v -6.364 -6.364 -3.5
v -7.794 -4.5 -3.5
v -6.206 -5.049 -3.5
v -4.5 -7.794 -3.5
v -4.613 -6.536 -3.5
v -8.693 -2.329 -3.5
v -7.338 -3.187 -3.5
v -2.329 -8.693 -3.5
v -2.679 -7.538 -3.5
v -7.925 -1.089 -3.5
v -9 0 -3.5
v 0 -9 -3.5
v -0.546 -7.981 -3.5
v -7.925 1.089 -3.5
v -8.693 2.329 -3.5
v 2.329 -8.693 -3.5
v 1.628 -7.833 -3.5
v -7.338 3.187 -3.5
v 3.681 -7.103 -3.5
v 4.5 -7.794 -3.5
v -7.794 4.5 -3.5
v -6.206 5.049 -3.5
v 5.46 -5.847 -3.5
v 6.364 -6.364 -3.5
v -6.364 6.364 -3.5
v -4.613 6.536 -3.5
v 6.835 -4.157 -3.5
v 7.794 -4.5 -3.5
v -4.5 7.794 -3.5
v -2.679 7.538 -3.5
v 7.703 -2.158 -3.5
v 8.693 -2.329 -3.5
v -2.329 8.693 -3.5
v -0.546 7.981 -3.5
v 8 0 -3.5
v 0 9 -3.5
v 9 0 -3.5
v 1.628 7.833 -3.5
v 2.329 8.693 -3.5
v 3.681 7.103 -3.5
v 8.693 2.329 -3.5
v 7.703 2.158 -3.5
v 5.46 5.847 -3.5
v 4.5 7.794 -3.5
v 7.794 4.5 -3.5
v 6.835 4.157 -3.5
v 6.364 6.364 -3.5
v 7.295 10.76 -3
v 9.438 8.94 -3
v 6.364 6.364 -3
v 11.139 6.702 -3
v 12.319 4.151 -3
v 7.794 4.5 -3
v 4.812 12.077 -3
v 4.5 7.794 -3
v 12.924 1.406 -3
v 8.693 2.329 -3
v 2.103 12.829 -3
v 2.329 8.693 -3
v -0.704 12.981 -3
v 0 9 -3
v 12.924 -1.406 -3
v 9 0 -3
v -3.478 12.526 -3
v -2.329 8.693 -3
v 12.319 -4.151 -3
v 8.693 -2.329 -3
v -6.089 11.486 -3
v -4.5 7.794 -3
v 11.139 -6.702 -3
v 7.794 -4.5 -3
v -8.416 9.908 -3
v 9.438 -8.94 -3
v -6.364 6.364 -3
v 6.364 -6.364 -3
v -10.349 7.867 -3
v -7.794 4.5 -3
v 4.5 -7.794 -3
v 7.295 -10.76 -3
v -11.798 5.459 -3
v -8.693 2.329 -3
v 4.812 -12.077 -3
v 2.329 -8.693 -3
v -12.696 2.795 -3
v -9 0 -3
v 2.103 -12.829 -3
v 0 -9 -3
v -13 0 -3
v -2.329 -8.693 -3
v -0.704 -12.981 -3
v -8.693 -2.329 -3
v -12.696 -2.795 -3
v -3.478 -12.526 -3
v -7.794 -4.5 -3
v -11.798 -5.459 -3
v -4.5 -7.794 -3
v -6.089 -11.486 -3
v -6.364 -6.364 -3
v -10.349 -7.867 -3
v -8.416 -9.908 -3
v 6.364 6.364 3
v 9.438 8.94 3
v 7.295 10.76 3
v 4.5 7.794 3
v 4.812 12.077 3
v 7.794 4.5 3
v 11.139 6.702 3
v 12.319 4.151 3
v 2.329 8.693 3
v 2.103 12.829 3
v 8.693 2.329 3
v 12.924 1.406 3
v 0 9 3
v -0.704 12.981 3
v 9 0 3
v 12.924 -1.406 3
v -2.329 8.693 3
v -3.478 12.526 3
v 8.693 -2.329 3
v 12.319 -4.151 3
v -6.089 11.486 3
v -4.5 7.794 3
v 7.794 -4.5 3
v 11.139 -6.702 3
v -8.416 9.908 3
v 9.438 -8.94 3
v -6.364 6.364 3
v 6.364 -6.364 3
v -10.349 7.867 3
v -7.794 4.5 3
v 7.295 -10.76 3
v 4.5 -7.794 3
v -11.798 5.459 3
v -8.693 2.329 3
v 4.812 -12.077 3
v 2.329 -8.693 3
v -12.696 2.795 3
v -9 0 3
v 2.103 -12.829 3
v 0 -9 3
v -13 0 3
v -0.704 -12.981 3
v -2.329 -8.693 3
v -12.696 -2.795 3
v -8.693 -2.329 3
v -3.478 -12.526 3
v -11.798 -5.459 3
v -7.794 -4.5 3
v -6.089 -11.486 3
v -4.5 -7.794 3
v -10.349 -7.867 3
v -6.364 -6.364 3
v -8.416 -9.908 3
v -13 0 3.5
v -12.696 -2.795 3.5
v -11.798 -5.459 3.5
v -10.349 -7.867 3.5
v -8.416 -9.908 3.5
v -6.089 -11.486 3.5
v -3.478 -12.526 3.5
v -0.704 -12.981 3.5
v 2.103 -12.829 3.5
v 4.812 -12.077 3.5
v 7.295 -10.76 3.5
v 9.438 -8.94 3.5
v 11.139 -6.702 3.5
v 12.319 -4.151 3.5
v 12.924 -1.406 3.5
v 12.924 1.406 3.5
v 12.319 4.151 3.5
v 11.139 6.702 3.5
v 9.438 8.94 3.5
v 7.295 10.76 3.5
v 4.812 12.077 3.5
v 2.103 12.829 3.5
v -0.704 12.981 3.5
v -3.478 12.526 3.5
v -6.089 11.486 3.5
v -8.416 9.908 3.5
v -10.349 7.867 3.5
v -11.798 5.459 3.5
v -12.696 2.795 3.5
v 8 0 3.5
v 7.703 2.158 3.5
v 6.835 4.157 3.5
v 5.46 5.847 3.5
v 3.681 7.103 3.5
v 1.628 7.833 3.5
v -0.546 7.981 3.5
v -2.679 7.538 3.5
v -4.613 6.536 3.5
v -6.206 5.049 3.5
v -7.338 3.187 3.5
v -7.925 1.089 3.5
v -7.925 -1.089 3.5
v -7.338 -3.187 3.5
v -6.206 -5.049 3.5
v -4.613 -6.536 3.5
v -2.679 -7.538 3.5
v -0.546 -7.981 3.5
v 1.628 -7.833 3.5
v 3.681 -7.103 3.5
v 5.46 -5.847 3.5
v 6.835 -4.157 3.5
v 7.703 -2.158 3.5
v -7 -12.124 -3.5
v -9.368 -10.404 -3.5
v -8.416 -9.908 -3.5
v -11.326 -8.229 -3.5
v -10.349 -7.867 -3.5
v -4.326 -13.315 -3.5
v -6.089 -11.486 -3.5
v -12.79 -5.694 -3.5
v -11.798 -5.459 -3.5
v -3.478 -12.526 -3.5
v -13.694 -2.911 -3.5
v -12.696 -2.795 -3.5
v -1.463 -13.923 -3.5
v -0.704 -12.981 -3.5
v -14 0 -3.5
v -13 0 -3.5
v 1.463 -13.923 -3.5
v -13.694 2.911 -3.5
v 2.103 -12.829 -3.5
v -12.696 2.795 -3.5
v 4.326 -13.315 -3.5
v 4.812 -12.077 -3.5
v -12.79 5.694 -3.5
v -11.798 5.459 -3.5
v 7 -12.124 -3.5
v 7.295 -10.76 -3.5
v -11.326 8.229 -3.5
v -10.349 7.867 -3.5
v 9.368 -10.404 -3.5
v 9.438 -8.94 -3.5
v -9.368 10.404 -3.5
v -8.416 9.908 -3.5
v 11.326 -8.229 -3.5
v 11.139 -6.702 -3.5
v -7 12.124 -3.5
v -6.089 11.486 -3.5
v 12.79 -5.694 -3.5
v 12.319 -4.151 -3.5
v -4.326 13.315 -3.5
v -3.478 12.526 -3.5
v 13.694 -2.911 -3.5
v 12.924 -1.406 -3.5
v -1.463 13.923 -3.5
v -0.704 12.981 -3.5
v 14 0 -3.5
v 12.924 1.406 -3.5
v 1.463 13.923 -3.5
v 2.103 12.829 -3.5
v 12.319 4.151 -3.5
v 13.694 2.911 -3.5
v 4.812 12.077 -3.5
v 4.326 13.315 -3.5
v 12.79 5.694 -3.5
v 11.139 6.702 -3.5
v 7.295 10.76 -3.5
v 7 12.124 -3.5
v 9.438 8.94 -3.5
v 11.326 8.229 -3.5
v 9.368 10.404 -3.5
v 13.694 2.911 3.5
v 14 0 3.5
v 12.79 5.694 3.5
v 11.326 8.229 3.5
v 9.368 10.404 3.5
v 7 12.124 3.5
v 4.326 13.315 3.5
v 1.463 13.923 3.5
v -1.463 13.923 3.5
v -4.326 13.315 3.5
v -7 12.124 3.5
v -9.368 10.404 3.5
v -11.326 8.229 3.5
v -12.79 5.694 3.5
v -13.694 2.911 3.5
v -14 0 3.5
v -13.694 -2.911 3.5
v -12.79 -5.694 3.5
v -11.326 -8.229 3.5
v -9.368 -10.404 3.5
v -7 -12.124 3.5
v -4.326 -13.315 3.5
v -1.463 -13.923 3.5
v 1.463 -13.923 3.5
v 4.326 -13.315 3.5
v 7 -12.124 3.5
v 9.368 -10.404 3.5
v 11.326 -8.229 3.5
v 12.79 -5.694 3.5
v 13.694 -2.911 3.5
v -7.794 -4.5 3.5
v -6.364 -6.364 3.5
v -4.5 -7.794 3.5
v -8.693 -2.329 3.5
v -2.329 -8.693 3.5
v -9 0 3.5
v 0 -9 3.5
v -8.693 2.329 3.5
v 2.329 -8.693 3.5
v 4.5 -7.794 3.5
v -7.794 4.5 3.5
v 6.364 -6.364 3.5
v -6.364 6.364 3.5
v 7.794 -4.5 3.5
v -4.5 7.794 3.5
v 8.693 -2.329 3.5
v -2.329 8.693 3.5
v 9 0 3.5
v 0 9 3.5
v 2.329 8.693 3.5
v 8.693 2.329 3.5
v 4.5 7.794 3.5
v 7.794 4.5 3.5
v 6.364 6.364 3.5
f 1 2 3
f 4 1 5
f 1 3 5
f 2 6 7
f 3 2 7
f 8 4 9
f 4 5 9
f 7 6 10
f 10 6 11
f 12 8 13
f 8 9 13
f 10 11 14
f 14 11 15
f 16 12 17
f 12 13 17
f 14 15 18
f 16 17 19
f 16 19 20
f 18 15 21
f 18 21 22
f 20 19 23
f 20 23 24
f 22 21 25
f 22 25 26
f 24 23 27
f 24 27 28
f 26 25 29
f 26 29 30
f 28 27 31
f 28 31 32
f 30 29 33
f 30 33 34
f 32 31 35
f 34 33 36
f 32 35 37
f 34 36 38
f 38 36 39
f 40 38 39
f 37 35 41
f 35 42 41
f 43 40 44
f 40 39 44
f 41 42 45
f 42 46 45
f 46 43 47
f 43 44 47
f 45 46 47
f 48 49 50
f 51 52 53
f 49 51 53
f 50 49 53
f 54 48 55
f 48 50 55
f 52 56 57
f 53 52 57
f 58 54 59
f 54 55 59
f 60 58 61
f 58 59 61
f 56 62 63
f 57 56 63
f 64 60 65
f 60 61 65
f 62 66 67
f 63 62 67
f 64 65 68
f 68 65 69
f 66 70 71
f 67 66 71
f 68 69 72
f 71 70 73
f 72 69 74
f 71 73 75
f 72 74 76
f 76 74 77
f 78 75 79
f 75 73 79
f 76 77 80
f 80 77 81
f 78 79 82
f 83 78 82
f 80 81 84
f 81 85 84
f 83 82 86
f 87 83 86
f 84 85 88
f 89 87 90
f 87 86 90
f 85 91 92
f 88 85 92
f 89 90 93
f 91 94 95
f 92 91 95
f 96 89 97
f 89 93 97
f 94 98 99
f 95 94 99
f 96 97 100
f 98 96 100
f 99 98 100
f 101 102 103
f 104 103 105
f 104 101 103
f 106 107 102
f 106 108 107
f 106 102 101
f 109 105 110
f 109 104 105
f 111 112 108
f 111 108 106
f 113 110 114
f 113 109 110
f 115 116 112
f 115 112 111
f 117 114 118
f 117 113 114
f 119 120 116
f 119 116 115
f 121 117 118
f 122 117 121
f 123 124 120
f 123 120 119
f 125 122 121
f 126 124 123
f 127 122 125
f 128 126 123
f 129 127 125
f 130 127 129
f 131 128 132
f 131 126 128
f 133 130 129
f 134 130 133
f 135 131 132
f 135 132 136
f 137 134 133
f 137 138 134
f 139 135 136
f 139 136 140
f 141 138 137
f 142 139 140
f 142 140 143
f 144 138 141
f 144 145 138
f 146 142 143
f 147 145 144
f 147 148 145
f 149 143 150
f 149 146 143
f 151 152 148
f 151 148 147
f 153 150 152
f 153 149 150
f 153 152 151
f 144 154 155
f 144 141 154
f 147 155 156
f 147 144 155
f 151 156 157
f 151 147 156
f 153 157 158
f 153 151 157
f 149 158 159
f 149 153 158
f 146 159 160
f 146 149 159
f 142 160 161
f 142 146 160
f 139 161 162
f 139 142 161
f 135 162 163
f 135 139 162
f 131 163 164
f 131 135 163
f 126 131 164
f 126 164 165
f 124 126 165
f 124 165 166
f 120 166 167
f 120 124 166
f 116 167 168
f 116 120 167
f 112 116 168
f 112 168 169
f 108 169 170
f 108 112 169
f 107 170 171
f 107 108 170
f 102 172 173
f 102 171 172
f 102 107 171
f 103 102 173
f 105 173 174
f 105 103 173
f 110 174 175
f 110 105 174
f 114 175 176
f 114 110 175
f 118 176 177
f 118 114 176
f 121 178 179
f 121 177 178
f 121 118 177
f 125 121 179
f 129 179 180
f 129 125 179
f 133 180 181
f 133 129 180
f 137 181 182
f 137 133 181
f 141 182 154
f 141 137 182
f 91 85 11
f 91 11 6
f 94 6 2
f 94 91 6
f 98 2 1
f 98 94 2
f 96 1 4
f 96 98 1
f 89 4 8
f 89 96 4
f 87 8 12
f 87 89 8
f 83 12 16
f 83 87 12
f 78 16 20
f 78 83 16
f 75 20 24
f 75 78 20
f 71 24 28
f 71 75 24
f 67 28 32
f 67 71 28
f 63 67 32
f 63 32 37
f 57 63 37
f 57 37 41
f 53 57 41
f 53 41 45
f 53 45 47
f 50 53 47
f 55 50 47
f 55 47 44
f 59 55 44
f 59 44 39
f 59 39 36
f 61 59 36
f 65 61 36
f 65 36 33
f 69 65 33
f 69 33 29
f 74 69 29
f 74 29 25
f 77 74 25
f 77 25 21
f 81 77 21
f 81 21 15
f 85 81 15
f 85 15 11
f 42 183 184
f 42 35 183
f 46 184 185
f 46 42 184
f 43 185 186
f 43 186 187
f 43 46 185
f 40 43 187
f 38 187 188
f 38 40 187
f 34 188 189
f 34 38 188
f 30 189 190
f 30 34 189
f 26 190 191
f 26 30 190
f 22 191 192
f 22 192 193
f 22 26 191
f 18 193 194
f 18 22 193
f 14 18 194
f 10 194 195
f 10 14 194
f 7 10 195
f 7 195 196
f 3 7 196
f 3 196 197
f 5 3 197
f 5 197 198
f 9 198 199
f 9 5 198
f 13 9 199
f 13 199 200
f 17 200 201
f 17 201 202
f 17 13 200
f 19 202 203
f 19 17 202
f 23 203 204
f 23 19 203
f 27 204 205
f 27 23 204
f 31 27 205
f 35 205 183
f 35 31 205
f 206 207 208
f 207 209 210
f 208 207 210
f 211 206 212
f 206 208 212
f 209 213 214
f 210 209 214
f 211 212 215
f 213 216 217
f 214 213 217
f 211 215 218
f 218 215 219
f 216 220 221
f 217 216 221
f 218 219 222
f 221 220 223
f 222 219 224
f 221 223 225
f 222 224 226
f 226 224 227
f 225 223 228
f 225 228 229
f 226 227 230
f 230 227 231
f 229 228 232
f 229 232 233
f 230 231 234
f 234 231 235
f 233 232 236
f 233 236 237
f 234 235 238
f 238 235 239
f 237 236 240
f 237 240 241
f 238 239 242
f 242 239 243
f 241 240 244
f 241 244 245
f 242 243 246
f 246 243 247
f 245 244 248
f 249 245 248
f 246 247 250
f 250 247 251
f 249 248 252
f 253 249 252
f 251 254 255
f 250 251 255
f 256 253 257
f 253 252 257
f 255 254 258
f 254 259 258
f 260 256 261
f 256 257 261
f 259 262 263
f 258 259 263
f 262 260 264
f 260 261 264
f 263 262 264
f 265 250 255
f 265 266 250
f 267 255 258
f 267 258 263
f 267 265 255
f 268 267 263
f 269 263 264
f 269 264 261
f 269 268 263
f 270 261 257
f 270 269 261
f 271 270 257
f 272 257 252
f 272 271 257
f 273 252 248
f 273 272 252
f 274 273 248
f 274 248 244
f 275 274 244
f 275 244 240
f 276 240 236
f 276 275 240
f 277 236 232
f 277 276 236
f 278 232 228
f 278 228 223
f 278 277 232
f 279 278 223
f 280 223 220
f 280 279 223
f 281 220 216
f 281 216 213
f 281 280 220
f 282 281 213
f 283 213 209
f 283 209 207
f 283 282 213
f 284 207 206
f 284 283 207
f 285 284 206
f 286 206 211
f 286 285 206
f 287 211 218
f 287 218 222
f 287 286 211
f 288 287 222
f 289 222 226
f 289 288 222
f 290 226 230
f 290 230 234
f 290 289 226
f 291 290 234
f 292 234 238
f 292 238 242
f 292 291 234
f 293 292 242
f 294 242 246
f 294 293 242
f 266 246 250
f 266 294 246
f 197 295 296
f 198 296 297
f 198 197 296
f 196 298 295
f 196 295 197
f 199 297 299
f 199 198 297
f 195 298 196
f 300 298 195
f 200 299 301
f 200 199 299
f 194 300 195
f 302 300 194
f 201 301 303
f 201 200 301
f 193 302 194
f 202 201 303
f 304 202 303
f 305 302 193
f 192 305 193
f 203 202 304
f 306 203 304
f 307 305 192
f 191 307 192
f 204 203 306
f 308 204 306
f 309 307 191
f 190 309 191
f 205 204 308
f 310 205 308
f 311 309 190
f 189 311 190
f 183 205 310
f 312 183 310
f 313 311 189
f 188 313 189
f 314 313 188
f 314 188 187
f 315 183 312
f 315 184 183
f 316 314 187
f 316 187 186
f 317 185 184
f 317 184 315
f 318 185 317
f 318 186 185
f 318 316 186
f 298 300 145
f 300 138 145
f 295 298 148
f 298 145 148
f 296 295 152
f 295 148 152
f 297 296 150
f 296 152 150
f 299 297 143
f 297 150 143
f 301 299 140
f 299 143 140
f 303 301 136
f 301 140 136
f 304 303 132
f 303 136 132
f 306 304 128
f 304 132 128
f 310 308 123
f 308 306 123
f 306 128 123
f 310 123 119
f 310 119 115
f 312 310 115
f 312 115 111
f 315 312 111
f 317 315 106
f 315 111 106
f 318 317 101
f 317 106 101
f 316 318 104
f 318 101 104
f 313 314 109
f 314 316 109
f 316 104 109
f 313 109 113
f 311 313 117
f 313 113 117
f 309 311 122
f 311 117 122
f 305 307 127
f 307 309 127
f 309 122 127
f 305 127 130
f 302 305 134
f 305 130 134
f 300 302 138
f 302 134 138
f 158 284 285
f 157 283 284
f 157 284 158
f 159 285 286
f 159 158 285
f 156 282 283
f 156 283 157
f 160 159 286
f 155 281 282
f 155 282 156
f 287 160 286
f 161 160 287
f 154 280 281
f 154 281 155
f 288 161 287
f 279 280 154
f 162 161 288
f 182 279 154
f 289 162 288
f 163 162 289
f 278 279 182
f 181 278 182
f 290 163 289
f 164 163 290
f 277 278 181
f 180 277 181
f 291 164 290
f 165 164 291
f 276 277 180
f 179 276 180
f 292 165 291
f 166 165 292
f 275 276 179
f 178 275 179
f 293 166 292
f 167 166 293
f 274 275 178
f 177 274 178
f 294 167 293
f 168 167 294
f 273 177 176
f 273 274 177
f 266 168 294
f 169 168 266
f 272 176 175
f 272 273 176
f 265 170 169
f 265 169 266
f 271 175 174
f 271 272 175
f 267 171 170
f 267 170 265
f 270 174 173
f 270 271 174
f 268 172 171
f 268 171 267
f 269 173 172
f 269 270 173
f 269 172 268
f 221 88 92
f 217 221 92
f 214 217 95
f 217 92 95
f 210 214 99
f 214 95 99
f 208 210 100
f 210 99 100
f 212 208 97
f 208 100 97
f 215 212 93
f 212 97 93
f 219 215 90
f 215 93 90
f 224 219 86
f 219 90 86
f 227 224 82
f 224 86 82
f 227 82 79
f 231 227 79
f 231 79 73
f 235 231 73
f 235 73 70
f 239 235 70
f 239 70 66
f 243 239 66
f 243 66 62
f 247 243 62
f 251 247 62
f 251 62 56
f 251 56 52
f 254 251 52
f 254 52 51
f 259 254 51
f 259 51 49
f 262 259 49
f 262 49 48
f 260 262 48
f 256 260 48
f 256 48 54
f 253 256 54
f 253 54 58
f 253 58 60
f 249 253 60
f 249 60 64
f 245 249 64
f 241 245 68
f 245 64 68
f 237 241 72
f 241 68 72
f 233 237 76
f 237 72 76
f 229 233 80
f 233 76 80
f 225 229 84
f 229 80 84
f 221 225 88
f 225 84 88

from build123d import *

# Parameters (mm, degrees)
SKETCH1_R           = 14
SKETCH1_R_2         = 8
BOSS_EXTRUDE1_DEPTH = 3.5
CUT_EXTRUDE1_START  = -0.5
SKETCH2_R           = 13
SKETCH2_R_2         = 9
CUT_EXTRUDE1_DEPTH  = 22.5


with BuildPart() as part:
    # Sketch1 → Boss-Extrude1 (new, symmetric)
    with BuildSketch(Plane.XY):
        Circle(SKETCH1_R)
        Circle(SKETCH1_R_2, mode=Mode.SUBTRACT)
    extrude(amount=BOSS_EXTRUDE1_DEPTH, both=True)

    # Sketch2 → Cut-Extrude1 (cut)
    with BuildSketch(Plane.XY.offset(3.5).offset(CUT_EXTRUDE1_START)):
        with Locations(Location((0, 0, 0), (0, 0, 180))):
            Circle(SKETCH2_R)
        with Locations(Location((0, 0, 0), (0, 0, 180))):
            Circle(SKETCH2_R_2, mode=Mode.SUBTRACT)
    cut_extrude1 = extrude(amount=CUT_EXTRUDE1_DEPTH, mode=Mode.SUBTRACT)

    # Mirror1: Cut-Extrude1 across plane
    add(cut_extrude1.mirror(Plane.XY), mode=Mode.SUBTRACT)

    # Mirror1 at the second plane: Cut-Extrude1 across plane
    add(cut_extrude1.mirror(Plane(origin=(0, 0, 0), x_dir=(0, 0, 1), z_dir=(1, 0, 0))), mode=Mode.SUBTRACT)


solid = part.part
